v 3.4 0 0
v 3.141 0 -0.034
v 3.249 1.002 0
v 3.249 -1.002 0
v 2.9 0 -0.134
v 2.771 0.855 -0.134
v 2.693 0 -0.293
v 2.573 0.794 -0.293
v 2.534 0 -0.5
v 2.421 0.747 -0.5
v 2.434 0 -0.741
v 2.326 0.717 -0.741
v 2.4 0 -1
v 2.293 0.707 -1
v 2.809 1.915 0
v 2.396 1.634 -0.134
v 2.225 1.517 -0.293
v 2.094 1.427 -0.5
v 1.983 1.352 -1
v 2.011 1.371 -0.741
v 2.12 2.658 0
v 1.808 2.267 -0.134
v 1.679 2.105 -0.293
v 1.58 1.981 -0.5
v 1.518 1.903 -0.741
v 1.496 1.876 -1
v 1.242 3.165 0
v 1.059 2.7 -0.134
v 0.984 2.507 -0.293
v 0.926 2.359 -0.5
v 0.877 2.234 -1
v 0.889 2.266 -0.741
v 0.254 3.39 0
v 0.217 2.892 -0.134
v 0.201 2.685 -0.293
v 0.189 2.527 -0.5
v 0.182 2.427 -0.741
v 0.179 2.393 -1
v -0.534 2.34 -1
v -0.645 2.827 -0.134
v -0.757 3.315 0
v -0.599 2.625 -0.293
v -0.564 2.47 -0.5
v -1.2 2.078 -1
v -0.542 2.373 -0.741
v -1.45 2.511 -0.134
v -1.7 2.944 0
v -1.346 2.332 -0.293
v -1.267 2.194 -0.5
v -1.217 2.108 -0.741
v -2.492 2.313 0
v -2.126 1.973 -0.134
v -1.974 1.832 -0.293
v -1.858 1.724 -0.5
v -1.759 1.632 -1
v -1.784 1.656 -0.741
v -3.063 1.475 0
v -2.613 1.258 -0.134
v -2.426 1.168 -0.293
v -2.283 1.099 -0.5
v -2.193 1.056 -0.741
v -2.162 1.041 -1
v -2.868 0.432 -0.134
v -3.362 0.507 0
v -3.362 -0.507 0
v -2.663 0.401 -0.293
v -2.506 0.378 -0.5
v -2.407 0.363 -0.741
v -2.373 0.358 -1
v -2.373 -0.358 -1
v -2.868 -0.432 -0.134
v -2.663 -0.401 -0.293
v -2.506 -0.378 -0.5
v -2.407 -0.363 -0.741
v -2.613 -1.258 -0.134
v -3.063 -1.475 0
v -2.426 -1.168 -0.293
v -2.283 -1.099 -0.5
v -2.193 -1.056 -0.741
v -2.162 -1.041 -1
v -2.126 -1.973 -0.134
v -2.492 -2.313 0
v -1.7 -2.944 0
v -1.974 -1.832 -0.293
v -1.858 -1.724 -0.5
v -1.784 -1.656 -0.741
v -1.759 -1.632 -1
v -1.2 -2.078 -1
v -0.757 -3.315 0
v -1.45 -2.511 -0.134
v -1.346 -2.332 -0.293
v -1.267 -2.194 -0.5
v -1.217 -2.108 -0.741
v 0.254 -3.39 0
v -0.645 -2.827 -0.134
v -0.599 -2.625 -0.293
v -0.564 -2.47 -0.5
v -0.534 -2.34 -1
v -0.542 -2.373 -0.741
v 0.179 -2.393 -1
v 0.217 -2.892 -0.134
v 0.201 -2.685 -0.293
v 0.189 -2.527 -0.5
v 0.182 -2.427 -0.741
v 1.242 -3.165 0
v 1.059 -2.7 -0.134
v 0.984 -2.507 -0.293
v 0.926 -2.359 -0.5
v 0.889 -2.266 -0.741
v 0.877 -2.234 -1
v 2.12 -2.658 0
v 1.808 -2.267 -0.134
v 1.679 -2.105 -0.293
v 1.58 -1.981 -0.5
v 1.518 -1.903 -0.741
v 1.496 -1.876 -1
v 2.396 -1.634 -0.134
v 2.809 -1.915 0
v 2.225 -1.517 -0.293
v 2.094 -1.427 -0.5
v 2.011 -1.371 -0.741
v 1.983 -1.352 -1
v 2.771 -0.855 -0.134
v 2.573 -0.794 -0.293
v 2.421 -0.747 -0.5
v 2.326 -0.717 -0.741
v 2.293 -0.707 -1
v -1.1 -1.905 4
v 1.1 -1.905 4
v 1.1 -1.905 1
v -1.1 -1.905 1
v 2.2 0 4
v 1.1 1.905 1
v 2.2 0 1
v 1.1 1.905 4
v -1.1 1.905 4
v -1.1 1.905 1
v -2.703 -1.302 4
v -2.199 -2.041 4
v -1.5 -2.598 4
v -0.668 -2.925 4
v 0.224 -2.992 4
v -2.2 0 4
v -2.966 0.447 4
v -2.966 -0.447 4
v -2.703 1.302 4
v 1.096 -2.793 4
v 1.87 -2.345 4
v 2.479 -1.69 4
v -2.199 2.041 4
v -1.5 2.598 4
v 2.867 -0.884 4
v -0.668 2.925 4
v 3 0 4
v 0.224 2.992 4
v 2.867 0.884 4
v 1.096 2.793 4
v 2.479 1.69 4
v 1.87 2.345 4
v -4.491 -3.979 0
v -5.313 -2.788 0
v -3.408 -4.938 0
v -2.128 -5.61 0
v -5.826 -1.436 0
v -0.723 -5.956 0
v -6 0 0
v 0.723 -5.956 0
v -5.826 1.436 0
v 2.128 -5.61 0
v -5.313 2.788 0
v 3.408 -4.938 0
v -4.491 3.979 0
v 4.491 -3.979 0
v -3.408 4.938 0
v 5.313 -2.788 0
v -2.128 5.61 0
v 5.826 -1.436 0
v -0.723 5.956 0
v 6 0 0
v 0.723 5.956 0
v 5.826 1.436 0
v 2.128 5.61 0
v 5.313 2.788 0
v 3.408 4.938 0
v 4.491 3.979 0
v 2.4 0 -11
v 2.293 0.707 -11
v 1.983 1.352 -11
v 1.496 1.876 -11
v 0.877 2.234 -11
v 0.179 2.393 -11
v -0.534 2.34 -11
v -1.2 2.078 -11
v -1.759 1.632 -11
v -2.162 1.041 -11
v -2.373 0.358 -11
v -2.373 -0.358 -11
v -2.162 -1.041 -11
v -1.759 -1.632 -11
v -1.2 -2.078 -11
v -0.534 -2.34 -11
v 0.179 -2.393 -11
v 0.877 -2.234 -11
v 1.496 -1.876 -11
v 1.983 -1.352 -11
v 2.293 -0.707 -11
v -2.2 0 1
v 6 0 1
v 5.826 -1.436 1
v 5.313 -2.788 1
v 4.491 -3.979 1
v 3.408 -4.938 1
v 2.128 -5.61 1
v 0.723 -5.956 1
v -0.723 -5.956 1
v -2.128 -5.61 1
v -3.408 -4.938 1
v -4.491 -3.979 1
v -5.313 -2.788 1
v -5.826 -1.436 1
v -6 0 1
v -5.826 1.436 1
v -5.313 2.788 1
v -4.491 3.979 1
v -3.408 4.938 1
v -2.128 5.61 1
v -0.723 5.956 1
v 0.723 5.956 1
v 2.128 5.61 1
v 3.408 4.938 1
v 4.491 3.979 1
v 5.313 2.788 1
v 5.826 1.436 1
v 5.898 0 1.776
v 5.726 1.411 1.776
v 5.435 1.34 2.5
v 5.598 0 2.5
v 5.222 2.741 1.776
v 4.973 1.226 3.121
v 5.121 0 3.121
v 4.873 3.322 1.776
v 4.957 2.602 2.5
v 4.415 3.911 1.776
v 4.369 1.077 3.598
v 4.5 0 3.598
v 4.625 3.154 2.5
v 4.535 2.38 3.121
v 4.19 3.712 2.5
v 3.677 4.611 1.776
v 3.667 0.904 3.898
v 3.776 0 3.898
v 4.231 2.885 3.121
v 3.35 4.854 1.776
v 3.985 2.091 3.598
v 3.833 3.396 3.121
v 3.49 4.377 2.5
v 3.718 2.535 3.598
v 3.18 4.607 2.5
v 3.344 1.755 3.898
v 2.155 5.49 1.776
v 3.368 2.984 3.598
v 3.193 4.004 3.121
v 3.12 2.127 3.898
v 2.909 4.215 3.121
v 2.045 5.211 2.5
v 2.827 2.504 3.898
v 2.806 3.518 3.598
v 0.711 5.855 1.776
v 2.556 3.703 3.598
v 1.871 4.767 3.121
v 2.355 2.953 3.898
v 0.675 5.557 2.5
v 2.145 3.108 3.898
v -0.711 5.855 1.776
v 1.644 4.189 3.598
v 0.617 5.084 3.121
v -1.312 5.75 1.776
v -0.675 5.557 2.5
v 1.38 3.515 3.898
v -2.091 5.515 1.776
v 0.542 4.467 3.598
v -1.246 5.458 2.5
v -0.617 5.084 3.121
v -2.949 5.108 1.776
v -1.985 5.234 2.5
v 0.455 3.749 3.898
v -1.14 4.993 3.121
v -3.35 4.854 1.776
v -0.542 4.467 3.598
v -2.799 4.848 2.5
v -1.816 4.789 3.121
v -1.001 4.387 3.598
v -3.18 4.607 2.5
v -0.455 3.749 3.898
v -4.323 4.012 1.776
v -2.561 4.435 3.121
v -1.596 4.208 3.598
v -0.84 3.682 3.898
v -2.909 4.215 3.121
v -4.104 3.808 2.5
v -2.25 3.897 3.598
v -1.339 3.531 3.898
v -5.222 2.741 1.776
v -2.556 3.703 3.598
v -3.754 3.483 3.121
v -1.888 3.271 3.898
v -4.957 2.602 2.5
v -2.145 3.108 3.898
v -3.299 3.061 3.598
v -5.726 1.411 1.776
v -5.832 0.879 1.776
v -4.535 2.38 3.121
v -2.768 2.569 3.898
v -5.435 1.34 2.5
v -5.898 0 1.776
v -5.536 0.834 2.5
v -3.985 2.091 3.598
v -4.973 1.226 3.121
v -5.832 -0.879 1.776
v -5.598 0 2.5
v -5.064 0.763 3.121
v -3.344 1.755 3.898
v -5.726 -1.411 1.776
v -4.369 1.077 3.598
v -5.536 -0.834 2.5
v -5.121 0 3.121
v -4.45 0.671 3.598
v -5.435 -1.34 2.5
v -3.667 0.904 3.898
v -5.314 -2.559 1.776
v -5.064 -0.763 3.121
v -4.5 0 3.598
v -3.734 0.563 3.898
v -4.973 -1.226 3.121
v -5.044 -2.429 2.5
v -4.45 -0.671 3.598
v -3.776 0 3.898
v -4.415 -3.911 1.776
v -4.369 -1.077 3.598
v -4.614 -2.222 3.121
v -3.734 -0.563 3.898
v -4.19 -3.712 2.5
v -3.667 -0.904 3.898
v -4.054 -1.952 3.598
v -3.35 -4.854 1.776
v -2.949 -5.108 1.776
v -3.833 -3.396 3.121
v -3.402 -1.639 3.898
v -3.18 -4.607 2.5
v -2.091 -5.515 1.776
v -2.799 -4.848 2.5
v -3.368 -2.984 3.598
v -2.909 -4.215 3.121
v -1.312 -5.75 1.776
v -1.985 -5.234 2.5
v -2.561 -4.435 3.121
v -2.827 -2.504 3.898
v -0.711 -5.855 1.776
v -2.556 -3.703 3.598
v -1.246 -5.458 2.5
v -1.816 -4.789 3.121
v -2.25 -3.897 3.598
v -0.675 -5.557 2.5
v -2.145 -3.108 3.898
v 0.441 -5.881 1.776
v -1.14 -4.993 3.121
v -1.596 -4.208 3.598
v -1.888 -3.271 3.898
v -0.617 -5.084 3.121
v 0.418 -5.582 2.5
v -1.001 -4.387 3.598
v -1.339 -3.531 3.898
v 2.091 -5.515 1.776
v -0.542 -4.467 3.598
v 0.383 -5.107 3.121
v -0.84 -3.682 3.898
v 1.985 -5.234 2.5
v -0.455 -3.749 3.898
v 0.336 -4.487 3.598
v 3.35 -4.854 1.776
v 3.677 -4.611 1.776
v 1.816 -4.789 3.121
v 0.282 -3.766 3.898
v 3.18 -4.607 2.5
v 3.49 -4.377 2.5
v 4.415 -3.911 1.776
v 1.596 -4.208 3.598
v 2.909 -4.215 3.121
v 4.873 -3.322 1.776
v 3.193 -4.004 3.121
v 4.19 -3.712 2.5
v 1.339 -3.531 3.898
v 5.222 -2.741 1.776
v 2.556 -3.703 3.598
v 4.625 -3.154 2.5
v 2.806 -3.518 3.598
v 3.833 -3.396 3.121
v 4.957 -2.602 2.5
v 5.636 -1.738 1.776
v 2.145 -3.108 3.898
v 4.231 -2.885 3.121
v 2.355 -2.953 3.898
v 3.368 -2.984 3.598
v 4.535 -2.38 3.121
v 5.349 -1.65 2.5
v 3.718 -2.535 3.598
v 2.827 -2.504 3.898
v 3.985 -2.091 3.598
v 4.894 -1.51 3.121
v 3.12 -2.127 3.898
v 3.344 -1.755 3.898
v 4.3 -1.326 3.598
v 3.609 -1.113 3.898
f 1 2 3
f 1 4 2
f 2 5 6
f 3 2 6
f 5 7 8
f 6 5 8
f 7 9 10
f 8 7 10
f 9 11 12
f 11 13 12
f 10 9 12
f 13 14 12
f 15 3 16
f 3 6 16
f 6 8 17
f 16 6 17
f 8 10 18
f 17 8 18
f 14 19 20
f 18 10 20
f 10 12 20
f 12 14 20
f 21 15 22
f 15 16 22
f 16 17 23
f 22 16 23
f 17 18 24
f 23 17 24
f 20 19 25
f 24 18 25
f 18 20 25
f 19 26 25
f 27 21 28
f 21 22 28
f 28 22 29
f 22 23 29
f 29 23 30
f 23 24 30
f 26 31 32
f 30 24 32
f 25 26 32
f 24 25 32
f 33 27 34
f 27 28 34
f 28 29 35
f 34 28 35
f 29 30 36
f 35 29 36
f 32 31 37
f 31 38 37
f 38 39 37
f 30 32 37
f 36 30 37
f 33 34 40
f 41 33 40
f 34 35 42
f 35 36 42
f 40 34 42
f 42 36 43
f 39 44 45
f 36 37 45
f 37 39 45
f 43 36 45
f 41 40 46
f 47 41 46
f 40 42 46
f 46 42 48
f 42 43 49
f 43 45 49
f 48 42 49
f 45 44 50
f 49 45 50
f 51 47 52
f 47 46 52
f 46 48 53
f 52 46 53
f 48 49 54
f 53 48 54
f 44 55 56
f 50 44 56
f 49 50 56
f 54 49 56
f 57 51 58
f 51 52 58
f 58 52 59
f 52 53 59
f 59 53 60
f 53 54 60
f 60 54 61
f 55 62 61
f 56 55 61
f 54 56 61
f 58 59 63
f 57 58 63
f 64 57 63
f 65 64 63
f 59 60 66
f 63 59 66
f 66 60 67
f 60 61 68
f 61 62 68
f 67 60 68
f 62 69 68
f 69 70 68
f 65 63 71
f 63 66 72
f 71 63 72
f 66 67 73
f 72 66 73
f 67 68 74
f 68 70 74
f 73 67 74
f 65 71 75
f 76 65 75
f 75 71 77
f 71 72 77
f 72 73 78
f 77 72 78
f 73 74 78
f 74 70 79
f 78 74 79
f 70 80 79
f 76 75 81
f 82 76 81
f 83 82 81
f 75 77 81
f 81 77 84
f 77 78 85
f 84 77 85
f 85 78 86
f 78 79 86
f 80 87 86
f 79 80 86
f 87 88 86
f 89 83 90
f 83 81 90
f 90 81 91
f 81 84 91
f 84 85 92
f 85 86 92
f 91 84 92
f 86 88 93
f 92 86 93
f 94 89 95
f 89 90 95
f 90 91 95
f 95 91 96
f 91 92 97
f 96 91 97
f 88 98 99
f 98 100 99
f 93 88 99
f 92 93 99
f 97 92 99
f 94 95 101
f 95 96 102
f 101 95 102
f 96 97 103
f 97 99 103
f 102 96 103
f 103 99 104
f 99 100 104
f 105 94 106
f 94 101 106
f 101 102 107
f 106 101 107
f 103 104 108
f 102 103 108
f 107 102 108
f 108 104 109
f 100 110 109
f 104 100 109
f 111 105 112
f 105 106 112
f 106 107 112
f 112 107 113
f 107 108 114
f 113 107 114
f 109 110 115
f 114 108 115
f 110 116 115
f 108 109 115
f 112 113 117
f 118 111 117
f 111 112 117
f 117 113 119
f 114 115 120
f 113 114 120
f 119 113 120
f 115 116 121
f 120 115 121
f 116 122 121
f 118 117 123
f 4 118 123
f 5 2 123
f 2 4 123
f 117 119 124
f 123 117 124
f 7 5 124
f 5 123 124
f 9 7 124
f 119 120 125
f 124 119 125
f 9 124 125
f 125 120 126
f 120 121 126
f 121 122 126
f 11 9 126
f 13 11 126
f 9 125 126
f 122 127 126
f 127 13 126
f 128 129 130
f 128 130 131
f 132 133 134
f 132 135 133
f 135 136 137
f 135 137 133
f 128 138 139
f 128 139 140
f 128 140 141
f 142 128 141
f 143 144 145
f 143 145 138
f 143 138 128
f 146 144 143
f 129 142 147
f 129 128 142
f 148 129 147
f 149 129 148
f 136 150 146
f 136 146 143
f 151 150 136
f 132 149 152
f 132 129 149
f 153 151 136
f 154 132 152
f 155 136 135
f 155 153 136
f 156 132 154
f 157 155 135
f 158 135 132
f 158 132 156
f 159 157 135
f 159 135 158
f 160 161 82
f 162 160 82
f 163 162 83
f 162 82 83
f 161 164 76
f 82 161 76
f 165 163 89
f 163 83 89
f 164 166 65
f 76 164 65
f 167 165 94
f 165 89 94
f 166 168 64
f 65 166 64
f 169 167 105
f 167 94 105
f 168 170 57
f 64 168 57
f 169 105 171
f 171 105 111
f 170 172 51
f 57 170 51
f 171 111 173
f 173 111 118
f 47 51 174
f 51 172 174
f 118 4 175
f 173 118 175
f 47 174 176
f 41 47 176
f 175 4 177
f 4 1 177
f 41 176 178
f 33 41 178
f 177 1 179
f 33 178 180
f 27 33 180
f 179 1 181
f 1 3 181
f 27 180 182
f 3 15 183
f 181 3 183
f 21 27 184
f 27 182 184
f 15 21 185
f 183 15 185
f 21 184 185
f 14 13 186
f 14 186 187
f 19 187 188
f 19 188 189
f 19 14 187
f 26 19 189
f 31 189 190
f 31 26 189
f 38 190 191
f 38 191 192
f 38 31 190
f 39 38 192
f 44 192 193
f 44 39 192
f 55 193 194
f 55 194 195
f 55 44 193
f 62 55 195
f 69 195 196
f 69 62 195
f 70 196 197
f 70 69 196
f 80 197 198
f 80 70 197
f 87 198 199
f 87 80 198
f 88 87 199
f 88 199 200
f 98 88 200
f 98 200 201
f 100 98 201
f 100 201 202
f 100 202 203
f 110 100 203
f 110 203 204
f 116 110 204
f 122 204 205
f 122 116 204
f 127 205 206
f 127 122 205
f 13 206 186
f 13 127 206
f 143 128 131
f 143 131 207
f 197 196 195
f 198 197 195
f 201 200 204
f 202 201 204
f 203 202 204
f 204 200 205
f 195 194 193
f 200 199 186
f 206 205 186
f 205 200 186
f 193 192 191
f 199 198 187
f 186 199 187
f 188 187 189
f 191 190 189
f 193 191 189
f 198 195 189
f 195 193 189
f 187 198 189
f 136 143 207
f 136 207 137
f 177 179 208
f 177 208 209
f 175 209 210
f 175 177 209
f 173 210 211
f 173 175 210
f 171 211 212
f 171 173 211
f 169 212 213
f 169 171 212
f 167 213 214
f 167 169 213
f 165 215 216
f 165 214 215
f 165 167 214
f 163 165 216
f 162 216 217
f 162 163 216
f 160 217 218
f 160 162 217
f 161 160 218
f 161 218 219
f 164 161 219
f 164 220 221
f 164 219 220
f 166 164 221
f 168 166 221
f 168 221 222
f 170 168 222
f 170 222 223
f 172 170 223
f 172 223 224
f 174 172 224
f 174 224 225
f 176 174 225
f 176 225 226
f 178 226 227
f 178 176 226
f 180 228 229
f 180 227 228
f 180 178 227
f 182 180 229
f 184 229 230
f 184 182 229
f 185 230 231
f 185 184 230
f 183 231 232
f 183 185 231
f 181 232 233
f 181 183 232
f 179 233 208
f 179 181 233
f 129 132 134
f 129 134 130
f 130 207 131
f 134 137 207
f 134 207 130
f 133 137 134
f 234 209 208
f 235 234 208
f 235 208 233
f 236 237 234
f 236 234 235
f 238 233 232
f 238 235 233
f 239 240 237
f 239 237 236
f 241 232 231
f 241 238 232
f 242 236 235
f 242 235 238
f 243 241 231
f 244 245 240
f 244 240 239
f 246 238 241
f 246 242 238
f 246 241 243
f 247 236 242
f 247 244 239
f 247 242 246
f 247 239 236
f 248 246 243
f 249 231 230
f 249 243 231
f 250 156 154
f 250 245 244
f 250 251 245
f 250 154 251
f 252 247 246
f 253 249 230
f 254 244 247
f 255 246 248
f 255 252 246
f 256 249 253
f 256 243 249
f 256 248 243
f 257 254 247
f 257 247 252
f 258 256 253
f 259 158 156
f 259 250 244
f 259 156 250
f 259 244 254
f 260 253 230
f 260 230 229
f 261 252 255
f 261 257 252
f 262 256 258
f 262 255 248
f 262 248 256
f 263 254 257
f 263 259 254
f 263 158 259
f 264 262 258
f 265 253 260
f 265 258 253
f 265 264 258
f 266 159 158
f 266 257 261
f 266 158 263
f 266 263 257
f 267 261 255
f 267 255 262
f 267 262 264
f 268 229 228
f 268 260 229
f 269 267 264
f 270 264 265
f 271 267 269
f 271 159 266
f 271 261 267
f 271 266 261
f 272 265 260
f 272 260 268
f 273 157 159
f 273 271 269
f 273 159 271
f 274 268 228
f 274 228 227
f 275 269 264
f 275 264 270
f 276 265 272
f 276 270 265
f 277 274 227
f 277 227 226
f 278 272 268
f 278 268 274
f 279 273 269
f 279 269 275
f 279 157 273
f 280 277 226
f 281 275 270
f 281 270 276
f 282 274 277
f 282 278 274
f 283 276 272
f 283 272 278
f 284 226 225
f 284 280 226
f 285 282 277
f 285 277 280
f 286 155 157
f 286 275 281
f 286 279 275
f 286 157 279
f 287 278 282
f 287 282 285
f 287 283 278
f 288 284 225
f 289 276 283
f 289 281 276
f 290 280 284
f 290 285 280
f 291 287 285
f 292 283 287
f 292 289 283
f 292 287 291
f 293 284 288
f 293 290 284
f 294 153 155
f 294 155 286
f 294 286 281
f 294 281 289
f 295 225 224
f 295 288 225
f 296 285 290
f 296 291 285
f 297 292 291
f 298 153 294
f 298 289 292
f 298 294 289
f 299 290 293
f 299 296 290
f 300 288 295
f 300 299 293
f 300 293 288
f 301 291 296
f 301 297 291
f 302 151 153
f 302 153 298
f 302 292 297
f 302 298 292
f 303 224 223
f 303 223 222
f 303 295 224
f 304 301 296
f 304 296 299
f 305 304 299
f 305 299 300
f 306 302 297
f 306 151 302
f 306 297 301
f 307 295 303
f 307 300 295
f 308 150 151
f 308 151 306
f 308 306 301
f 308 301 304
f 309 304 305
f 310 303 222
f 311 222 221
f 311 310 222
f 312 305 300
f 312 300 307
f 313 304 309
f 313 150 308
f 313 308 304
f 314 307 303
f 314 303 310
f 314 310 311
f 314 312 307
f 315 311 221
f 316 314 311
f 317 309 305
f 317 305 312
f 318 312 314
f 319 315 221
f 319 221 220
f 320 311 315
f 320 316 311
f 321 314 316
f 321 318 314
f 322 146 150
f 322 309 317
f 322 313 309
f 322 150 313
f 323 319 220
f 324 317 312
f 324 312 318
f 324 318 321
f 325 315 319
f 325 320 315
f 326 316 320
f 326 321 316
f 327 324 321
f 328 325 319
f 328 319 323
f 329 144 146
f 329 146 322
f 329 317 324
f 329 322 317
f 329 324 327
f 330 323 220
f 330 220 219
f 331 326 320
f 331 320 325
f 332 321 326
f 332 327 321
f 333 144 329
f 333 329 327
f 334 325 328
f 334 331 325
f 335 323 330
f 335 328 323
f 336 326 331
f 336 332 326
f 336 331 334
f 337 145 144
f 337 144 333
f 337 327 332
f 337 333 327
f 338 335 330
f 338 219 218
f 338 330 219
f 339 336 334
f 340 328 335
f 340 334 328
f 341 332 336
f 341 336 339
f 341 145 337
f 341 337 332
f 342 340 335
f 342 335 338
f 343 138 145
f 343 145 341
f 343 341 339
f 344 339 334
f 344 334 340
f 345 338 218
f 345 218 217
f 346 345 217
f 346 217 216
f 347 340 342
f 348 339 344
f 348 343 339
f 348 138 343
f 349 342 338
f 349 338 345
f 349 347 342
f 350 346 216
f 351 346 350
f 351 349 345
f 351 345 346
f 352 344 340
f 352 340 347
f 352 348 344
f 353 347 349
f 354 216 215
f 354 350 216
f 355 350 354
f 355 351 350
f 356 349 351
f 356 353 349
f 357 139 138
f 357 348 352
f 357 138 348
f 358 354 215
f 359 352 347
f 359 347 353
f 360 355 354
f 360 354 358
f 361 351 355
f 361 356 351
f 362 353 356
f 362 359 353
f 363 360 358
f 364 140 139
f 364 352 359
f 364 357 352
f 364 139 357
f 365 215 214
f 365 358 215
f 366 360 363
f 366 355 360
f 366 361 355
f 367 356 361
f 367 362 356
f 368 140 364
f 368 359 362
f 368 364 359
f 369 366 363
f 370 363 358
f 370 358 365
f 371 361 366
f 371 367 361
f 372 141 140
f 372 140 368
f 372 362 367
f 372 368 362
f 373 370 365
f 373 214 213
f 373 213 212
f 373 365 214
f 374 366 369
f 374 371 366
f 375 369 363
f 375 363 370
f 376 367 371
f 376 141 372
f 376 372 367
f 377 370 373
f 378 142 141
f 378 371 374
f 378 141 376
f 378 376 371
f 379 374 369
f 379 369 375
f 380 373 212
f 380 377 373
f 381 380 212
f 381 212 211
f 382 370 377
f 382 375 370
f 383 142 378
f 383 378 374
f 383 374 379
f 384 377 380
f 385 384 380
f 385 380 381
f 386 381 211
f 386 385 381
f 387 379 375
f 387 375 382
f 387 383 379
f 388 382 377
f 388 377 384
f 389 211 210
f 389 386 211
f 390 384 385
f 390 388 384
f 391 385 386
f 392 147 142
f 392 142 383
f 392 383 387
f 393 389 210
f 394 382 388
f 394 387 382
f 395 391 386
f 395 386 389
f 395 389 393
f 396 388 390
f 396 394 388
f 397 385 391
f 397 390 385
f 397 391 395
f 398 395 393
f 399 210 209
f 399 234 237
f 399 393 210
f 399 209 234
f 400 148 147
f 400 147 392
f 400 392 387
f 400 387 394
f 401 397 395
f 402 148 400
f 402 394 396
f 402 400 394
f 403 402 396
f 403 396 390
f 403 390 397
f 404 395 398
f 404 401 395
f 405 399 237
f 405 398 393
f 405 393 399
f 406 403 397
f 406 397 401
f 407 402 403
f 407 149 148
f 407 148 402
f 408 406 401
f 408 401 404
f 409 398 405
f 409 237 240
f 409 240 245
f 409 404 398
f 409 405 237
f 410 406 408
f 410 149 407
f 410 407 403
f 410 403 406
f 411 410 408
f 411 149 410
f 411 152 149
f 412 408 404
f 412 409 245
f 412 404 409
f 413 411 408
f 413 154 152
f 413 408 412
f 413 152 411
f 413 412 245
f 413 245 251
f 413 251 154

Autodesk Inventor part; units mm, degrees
ref_plane "YZ Plane" through (0, 0, 0) normal (1, 0, 0) x (0, 1, 0)
ref_plane "XZ Plane" through (0, 0, 0) normal (0, 1, 0) x (-1, 0, 0)
ref_plane "XY Plane" through (0, 0, 0) normal (0, 0, 1) x (1, 0, 0)
sketch "Sketch1" plane through (0, 0, 0) normal (0, 0, 1) x (1, 0, 0)
  circle A0 centre (0, 0) radius 2.4
  circle A1 centre (0, 0) radius 6
  dimension "d0" = 4.8
  dimension "d1" = 12
extrude "Extrusion1" add sketch "Sketch1" along normal blind 4 contours A0 | A1
extrude "Extrusion2" add sketch "Sketch1" against normal blind 11 contours A0
fillet "Fillet1" radius 1 1 edges at (-2.4, 0, 0)
fillet "Fillet2" radius 3 1 edges at (-6, 0, 4)
sketch "Sketch2" plane through (0, 0, 4) normal (0, 0, 1) x (1, 0, 0)
  line L0 (2.2, 0) -> (1.1, -1.9053)
  line L1 (1.1, -1.9053) -> (-1.1, -1.9053)
  line L2 (-1.1, -1.9053) -> (-2.2, 0)
  line L3 (-2.2, 0) -> (-1.1, 1.9053)
  line L4 (-1.1, 1.9053) -> (1.1, 1.9053)
  line L5 (1.1, 1.9053) -> (2.2, 0)
  point P0 (0, 0)
  point P1 (0, 0)
  dimension "d8" = 4.4
extrude "Extrusion3" cut sketch "Sketch2" against normal blind 3
thread "Thread1" size "M5x0.8" class "6g" standard "ANSI Metric M Profile" full length
properties part number "SkaterInsertScrew" material "Stainless Steel"
